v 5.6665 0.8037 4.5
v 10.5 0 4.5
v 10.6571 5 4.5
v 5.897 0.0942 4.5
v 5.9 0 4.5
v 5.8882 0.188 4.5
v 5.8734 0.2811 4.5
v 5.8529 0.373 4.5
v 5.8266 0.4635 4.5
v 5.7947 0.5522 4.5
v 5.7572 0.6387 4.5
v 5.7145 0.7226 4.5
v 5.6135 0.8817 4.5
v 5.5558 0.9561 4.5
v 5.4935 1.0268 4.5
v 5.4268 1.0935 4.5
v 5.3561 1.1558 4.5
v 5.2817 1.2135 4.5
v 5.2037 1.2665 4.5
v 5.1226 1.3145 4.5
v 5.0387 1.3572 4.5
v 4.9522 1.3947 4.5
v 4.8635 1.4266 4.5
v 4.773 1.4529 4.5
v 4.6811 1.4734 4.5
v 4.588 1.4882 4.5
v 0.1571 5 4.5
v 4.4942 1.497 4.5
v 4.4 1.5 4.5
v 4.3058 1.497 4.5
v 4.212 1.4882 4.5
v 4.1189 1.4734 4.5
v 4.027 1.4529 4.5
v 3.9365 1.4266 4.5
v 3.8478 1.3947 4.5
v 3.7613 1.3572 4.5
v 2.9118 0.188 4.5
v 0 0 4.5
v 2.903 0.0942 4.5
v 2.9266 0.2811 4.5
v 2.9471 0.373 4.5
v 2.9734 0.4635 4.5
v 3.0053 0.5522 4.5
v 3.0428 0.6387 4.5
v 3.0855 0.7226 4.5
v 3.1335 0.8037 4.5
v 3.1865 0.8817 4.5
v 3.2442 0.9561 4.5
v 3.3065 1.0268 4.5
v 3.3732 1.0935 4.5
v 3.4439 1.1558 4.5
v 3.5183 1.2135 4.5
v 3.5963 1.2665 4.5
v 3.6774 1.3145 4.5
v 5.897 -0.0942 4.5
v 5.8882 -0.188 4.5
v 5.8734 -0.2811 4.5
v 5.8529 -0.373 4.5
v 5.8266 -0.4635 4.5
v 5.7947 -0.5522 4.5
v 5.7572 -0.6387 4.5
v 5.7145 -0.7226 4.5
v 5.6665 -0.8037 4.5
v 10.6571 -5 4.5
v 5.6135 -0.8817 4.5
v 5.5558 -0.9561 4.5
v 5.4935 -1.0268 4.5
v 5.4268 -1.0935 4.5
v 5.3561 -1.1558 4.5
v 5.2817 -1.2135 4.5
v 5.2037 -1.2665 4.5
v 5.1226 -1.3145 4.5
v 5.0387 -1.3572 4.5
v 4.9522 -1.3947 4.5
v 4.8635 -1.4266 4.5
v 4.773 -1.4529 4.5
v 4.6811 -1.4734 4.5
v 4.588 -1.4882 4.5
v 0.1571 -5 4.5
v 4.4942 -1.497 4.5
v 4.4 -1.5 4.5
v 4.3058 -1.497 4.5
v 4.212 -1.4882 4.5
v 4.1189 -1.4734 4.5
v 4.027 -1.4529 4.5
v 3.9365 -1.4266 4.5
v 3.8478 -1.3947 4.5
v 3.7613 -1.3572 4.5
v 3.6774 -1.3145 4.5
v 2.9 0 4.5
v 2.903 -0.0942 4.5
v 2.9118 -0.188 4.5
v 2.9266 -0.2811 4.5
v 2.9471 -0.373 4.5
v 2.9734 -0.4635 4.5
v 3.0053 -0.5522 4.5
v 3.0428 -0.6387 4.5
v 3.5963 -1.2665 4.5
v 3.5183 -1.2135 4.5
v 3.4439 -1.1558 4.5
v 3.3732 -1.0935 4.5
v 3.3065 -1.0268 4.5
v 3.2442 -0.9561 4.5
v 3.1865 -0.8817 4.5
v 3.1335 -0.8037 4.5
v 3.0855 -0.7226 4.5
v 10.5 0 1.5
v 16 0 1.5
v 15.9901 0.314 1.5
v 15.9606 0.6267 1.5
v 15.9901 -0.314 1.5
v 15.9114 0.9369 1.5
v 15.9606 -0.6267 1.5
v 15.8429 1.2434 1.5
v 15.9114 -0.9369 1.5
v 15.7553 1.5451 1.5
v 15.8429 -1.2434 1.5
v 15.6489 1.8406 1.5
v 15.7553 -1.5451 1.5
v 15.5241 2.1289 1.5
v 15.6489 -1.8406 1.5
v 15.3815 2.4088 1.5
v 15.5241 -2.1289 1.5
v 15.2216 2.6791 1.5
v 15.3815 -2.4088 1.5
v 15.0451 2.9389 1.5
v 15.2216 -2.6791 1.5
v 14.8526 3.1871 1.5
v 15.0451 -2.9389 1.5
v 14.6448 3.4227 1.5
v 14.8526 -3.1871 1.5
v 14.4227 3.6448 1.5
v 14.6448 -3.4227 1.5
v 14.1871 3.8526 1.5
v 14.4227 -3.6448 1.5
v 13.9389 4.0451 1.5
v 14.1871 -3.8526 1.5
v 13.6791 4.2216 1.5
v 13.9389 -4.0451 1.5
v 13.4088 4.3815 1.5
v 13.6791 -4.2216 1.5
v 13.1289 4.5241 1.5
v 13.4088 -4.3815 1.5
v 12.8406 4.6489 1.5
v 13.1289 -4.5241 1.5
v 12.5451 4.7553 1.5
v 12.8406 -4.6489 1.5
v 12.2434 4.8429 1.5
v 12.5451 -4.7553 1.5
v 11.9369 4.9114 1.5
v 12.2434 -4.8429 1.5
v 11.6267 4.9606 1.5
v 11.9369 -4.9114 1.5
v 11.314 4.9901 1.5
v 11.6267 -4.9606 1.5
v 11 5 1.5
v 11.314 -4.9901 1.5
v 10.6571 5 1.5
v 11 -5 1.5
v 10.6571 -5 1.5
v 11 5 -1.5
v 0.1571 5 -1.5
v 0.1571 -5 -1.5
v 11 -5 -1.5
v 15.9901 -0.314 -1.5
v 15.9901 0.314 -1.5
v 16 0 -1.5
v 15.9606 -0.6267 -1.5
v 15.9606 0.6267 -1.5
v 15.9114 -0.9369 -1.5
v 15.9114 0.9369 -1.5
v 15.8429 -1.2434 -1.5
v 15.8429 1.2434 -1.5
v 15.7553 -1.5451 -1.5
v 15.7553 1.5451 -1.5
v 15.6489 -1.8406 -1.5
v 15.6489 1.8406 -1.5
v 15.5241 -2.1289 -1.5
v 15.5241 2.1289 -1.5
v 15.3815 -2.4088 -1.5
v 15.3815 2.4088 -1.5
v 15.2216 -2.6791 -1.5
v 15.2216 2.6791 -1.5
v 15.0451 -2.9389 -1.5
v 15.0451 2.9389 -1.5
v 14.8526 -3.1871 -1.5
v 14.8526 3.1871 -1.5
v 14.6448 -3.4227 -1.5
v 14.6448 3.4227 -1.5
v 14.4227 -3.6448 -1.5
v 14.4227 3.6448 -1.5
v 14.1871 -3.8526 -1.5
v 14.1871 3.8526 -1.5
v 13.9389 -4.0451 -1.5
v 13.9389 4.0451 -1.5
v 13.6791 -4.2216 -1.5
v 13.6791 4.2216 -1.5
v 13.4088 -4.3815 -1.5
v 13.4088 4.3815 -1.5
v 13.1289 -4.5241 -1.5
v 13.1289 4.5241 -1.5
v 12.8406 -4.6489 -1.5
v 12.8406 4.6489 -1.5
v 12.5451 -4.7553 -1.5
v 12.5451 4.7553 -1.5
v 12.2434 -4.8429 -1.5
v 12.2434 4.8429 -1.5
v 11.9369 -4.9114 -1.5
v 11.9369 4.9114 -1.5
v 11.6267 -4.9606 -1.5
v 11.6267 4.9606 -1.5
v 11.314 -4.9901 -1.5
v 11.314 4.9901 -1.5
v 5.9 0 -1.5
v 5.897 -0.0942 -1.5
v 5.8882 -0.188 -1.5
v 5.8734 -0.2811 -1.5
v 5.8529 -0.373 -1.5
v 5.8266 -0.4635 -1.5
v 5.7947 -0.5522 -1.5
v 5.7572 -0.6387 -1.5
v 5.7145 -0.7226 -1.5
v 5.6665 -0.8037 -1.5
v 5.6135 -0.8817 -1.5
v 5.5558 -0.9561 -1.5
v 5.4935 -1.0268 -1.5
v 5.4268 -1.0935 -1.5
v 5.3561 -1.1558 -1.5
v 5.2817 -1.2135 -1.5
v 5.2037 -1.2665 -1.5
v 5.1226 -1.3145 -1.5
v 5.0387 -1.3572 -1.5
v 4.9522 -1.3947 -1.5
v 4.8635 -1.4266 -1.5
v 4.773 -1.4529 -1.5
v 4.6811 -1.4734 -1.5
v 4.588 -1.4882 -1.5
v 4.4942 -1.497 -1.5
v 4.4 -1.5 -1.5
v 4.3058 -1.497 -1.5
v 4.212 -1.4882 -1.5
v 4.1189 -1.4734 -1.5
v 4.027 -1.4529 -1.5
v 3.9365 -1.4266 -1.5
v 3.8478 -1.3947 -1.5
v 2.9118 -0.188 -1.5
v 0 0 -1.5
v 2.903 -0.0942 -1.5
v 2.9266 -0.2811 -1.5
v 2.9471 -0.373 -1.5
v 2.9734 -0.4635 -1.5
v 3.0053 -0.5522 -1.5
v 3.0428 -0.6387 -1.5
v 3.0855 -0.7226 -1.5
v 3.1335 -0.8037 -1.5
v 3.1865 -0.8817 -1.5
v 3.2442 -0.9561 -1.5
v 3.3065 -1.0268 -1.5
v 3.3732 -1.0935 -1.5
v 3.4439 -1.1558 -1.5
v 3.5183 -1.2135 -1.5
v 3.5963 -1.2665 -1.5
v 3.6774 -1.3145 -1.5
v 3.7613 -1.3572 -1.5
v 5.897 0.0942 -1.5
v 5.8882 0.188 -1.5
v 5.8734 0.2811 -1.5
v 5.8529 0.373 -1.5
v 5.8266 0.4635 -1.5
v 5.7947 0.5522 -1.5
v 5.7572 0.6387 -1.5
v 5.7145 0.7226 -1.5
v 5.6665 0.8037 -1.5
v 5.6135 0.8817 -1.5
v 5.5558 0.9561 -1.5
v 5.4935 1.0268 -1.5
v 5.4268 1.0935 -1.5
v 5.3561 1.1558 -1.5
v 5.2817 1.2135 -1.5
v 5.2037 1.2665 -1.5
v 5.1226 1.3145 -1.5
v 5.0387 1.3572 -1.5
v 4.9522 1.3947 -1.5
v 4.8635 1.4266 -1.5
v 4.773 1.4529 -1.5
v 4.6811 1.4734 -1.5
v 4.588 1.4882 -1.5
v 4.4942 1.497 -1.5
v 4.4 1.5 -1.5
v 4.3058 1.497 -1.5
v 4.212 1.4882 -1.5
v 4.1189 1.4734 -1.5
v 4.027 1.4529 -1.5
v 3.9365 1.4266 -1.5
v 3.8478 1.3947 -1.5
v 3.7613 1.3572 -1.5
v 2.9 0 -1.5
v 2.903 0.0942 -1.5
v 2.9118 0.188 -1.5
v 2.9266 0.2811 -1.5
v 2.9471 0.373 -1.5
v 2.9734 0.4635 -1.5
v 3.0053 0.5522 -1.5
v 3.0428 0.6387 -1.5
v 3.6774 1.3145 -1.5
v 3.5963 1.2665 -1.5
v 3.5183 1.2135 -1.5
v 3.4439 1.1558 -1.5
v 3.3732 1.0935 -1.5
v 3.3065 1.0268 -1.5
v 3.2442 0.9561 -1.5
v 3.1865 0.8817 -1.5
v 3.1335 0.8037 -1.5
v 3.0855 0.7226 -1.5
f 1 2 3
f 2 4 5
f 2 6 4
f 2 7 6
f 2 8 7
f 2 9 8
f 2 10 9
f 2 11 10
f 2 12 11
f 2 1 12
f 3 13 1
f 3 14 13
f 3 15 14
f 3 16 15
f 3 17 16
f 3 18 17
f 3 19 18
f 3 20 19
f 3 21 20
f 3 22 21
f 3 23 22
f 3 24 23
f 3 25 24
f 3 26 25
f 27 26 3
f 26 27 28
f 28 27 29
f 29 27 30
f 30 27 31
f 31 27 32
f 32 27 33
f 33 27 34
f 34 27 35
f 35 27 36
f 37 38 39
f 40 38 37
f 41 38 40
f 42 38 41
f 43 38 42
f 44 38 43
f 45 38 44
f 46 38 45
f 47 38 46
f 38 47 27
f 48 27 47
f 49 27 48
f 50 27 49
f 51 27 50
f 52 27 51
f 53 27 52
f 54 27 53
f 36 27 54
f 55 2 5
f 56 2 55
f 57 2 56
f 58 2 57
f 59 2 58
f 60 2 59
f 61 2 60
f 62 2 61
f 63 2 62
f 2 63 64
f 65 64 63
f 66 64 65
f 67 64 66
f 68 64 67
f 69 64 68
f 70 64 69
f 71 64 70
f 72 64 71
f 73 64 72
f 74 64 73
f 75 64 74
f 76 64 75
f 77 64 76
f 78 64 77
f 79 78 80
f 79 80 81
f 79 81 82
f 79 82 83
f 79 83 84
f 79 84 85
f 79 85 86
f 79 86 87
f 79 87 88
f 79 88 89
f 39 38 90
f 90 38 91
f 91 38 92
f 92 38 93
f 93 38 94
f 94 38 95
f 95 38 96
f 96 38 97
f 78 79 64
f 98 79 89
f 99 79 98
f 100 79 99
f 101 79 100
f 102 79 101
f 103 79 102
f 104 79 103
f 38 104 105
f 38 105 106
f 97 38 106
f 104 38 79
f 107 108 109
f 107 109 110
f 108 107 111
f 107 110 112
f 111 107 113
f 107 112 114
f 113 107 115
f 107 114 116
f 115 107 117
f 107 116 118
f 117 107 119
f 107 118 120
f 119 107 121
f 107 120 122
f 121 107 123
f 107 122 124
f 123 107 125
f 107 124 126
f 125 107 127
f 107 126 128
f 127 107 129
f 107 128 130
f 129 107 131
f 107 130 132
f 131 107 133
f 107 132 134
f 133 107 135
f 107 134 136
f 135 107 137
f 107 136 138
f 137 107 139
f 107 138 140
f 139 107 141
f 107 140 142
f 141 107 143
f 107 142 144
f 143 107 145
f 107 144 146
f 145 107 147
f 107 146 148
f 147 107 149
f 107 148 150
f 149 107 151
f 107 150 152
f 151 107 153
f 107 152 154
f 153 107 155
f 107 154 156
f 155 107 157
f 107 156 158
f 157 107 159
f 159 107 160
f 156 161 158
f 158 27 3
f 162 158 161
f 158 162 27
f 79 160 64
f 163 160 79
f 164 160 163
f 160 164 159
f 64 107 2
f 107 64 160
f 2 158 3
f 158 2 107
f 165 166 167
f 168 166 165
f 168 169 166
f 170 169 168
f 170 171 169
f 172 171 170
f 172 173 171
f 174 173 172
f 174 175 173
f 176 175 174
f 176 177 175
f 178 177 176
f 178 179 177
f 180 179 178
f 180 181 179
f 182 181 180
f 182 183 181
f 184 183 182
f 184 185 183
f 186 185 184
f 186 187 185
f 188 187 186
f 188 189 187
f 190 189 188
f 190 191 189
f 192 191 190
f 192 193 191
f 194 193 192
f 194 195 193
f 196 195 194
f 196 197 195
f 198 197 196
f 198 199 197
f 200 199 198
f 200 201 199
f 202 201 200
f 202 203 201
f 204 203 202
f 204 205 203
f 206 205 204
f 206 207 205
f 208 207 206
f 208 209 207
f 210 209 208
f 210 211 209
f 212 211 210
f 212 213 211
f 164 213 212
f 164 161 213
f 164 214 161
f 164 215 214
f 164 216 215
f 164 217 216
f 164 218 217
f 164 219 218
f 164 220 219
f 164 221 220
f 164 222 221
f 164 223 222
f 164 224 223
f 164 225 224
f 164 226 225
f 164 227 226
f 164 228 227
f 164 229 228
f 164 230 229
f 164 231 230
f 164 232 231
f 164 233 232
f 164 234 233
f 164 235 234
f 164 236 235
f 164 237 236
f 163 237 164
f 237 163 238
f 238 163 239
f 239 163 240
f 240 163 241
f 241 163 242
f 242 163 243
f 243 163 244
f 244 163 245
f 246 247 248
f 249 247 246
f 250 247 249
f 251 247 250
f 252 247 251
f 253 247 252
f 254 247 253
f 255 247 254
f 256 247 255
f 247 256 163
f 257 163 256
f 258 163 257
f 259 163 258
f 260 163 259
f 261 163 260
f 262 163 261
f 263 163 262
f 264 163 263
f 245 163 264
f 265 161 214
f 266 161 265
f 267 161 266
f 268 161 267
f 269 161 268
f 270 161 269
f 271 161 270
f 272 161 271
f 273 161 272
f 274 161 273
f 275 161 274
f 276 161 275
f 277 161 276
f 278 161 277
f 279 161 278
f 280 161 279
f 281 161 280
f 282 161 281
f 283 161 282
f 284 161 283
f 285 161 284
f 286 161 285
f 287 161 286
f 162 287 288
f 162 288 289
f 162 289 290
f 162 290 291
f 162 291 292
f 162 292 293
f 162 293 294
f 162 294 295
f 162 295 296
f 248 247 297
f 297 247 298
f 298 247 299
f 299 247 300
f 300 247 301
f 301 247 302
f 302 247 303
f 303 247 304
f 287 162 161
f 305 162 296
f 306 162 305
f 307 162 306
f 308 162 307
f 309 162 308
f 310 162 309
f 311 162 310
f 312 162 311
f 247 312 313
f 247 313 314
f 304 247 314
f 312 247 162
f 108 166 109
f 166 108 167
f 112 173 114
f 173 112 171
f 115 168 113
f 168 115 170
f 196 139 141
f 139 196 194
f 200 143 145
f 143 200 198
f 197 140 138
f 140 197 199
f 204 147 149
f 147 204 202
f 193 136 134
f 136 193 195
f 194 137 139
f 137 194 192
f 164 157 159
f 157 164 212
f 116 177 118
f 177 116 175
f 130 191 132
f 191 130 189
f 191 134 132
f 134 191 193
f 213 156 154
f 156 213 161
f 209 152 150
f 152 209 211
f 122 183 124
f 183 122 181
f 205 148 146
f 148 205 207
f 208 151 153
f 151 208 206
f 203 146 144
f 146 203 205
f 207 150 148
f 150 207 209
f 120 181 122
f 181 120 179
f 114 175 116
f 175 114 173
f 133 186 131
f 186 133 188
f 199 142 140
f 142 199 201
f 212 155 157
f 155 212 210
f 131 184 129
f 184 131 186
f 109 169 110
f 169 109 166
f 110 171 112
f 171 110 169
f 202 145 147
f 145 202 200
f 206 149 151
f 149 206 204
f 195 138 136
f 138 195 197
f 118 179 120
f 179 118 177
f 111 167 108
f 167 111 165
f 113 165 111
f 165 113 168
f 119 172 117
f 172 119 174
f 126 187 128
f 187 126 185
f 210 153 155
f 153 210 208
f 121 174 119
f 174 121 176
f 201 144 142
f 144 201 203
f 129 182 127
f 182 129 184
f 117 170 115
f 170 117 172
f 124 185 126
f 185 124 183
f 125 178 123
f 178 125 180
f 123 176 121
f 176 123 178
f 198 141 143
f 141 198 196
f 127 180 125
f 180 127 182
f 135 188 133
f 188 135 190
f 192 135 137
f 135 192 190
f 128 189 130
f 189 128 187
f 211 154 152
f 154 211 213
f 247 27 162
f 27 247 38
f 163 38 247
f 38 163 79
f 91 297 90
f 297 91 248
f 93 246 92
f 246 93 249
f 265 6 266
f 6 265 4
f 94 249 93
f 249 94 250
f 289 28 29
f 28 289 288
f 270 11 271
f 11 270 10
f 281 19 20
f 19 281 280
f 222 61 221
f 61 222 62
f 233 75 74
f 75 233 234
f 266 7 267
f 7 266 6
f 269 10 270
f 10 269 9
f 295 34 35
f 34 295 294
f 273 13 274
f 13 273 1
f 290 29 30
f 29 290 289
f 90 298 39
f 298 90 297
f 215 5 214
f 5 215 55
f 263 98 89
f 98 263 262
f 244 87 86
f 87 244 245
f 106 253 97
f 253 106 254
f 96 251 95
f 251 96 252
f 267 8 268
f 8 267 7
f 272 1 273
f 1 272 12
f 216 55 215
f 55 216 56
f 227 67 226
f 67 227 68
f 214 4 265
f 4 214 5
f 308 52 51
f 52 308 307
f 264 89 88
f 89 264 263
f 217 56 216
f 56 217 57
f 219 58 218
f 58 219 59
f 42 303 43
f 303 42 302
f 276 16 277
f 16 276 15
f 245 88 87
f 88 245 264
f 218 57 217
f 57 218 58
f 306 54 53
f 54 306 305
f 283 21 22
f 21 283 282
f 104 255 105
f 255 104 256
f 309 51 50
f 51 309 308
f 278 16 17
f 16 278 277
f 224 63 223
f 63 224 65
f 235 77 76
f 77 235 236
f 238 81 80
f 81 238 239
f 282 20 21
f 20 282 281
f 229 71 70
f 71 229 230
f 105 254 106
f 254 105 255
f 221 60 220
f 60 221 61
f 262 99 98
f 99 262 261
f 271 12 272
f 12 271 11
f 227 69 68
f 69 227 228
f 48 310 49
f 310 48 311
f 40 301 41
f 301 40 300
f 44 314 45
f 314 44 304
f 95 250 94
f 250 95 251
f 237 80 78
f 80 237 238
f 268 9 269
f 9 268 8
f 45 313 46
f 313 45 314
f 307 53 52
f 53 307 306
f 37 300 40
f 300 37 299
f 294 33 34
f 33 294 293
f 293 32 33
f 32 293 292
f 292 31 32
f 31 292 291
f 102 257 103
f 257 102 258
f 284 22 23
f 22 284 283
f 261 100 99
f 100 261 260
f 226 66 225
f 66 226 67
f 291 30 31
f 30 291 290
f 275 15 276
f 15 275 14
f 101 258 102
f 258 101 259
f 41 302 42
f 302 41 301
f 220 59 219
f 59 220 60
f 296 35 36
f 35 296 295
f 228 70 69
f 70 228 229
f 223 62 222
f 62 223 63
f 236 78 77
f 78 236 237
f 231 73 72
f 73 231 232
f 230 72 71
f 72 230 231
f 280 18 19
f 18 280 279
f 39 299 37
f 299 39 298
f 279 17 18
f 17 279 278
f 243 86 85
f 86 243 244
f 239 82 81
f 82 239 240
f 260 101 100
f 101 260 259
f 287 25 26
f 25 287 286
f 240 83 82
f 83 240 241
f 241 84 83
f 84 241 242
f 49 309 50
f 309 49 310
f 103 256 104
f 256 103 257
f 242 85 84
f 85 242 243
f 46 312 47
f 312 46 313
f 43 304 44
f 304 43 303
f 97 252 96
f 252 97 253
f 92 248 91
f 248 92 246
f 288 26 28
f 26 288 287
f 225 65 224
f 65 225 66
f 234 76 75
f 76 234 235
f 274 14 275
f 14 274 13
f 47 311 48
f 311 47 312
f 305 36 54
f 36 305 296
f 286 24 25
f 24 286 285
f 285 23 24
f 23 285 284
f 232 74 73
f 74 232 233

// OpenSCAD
//  He3D K200 Heated Bed Clamps for securing
//  Glass Plate

$fn = 100;
HB_DIAMETER = 220;
GP_DIAMETER = 199;
GP_HEIGHT = 3;
BOLT_DIAMETER = 3;
CLAMP_WIDTH = 10;
LOWER_DISTANCE = 11;

difference() {
	intersection() {
		union() {
			// Lower Layer
			difference() {
				translate([LOWER_DISTANCE / 2, 0, GP_HEIGHT]) 
					cube([LOWER_DISTANCE, 
						  CLAMP_WIDTH,
						  GP_HEIGHT], 
						  center = true);
				// Glass Plate curve
				translate([HB_DIAMETER / 2, 0, 0]) 
					cylinder(r = GP_DIAMETER / 2, 
							 h = GP_HEIGHT * 2.5);
			}
			
			// Upper Layer
			union() {
				translate([LOWER_DISTANCE / 2, 0, 0]) 
					cube([LOWER_DISTANCE, 
						  CLAMP_WIDTH,
						  GP_HEIGHT], 
						  center = true);
				
				translate([LOWER_DISTANCE, 0, 0]) 
					cylinder(r = CLAMP_WIDTH / 2,
							 h = GP_HEIGHT, 
							 center = true);
			}
		}
	
		// Heated Bed curve
		translate([HB_DIAMETER / 2, 0, -GP_HEIGHT]) 
		cylinder(r = HB_DIAMETER /2, 
				 h = GP_HEIGHT * 3);
	}
	// Bolt Hole
	translate([LOWER_DISTANCE * 0.4, 0, -GP_HEIGHT]) 
	cylinder(r = BOLT_DIAMETER / 2,
			 h = GP_HEIGHT * 3);
}
